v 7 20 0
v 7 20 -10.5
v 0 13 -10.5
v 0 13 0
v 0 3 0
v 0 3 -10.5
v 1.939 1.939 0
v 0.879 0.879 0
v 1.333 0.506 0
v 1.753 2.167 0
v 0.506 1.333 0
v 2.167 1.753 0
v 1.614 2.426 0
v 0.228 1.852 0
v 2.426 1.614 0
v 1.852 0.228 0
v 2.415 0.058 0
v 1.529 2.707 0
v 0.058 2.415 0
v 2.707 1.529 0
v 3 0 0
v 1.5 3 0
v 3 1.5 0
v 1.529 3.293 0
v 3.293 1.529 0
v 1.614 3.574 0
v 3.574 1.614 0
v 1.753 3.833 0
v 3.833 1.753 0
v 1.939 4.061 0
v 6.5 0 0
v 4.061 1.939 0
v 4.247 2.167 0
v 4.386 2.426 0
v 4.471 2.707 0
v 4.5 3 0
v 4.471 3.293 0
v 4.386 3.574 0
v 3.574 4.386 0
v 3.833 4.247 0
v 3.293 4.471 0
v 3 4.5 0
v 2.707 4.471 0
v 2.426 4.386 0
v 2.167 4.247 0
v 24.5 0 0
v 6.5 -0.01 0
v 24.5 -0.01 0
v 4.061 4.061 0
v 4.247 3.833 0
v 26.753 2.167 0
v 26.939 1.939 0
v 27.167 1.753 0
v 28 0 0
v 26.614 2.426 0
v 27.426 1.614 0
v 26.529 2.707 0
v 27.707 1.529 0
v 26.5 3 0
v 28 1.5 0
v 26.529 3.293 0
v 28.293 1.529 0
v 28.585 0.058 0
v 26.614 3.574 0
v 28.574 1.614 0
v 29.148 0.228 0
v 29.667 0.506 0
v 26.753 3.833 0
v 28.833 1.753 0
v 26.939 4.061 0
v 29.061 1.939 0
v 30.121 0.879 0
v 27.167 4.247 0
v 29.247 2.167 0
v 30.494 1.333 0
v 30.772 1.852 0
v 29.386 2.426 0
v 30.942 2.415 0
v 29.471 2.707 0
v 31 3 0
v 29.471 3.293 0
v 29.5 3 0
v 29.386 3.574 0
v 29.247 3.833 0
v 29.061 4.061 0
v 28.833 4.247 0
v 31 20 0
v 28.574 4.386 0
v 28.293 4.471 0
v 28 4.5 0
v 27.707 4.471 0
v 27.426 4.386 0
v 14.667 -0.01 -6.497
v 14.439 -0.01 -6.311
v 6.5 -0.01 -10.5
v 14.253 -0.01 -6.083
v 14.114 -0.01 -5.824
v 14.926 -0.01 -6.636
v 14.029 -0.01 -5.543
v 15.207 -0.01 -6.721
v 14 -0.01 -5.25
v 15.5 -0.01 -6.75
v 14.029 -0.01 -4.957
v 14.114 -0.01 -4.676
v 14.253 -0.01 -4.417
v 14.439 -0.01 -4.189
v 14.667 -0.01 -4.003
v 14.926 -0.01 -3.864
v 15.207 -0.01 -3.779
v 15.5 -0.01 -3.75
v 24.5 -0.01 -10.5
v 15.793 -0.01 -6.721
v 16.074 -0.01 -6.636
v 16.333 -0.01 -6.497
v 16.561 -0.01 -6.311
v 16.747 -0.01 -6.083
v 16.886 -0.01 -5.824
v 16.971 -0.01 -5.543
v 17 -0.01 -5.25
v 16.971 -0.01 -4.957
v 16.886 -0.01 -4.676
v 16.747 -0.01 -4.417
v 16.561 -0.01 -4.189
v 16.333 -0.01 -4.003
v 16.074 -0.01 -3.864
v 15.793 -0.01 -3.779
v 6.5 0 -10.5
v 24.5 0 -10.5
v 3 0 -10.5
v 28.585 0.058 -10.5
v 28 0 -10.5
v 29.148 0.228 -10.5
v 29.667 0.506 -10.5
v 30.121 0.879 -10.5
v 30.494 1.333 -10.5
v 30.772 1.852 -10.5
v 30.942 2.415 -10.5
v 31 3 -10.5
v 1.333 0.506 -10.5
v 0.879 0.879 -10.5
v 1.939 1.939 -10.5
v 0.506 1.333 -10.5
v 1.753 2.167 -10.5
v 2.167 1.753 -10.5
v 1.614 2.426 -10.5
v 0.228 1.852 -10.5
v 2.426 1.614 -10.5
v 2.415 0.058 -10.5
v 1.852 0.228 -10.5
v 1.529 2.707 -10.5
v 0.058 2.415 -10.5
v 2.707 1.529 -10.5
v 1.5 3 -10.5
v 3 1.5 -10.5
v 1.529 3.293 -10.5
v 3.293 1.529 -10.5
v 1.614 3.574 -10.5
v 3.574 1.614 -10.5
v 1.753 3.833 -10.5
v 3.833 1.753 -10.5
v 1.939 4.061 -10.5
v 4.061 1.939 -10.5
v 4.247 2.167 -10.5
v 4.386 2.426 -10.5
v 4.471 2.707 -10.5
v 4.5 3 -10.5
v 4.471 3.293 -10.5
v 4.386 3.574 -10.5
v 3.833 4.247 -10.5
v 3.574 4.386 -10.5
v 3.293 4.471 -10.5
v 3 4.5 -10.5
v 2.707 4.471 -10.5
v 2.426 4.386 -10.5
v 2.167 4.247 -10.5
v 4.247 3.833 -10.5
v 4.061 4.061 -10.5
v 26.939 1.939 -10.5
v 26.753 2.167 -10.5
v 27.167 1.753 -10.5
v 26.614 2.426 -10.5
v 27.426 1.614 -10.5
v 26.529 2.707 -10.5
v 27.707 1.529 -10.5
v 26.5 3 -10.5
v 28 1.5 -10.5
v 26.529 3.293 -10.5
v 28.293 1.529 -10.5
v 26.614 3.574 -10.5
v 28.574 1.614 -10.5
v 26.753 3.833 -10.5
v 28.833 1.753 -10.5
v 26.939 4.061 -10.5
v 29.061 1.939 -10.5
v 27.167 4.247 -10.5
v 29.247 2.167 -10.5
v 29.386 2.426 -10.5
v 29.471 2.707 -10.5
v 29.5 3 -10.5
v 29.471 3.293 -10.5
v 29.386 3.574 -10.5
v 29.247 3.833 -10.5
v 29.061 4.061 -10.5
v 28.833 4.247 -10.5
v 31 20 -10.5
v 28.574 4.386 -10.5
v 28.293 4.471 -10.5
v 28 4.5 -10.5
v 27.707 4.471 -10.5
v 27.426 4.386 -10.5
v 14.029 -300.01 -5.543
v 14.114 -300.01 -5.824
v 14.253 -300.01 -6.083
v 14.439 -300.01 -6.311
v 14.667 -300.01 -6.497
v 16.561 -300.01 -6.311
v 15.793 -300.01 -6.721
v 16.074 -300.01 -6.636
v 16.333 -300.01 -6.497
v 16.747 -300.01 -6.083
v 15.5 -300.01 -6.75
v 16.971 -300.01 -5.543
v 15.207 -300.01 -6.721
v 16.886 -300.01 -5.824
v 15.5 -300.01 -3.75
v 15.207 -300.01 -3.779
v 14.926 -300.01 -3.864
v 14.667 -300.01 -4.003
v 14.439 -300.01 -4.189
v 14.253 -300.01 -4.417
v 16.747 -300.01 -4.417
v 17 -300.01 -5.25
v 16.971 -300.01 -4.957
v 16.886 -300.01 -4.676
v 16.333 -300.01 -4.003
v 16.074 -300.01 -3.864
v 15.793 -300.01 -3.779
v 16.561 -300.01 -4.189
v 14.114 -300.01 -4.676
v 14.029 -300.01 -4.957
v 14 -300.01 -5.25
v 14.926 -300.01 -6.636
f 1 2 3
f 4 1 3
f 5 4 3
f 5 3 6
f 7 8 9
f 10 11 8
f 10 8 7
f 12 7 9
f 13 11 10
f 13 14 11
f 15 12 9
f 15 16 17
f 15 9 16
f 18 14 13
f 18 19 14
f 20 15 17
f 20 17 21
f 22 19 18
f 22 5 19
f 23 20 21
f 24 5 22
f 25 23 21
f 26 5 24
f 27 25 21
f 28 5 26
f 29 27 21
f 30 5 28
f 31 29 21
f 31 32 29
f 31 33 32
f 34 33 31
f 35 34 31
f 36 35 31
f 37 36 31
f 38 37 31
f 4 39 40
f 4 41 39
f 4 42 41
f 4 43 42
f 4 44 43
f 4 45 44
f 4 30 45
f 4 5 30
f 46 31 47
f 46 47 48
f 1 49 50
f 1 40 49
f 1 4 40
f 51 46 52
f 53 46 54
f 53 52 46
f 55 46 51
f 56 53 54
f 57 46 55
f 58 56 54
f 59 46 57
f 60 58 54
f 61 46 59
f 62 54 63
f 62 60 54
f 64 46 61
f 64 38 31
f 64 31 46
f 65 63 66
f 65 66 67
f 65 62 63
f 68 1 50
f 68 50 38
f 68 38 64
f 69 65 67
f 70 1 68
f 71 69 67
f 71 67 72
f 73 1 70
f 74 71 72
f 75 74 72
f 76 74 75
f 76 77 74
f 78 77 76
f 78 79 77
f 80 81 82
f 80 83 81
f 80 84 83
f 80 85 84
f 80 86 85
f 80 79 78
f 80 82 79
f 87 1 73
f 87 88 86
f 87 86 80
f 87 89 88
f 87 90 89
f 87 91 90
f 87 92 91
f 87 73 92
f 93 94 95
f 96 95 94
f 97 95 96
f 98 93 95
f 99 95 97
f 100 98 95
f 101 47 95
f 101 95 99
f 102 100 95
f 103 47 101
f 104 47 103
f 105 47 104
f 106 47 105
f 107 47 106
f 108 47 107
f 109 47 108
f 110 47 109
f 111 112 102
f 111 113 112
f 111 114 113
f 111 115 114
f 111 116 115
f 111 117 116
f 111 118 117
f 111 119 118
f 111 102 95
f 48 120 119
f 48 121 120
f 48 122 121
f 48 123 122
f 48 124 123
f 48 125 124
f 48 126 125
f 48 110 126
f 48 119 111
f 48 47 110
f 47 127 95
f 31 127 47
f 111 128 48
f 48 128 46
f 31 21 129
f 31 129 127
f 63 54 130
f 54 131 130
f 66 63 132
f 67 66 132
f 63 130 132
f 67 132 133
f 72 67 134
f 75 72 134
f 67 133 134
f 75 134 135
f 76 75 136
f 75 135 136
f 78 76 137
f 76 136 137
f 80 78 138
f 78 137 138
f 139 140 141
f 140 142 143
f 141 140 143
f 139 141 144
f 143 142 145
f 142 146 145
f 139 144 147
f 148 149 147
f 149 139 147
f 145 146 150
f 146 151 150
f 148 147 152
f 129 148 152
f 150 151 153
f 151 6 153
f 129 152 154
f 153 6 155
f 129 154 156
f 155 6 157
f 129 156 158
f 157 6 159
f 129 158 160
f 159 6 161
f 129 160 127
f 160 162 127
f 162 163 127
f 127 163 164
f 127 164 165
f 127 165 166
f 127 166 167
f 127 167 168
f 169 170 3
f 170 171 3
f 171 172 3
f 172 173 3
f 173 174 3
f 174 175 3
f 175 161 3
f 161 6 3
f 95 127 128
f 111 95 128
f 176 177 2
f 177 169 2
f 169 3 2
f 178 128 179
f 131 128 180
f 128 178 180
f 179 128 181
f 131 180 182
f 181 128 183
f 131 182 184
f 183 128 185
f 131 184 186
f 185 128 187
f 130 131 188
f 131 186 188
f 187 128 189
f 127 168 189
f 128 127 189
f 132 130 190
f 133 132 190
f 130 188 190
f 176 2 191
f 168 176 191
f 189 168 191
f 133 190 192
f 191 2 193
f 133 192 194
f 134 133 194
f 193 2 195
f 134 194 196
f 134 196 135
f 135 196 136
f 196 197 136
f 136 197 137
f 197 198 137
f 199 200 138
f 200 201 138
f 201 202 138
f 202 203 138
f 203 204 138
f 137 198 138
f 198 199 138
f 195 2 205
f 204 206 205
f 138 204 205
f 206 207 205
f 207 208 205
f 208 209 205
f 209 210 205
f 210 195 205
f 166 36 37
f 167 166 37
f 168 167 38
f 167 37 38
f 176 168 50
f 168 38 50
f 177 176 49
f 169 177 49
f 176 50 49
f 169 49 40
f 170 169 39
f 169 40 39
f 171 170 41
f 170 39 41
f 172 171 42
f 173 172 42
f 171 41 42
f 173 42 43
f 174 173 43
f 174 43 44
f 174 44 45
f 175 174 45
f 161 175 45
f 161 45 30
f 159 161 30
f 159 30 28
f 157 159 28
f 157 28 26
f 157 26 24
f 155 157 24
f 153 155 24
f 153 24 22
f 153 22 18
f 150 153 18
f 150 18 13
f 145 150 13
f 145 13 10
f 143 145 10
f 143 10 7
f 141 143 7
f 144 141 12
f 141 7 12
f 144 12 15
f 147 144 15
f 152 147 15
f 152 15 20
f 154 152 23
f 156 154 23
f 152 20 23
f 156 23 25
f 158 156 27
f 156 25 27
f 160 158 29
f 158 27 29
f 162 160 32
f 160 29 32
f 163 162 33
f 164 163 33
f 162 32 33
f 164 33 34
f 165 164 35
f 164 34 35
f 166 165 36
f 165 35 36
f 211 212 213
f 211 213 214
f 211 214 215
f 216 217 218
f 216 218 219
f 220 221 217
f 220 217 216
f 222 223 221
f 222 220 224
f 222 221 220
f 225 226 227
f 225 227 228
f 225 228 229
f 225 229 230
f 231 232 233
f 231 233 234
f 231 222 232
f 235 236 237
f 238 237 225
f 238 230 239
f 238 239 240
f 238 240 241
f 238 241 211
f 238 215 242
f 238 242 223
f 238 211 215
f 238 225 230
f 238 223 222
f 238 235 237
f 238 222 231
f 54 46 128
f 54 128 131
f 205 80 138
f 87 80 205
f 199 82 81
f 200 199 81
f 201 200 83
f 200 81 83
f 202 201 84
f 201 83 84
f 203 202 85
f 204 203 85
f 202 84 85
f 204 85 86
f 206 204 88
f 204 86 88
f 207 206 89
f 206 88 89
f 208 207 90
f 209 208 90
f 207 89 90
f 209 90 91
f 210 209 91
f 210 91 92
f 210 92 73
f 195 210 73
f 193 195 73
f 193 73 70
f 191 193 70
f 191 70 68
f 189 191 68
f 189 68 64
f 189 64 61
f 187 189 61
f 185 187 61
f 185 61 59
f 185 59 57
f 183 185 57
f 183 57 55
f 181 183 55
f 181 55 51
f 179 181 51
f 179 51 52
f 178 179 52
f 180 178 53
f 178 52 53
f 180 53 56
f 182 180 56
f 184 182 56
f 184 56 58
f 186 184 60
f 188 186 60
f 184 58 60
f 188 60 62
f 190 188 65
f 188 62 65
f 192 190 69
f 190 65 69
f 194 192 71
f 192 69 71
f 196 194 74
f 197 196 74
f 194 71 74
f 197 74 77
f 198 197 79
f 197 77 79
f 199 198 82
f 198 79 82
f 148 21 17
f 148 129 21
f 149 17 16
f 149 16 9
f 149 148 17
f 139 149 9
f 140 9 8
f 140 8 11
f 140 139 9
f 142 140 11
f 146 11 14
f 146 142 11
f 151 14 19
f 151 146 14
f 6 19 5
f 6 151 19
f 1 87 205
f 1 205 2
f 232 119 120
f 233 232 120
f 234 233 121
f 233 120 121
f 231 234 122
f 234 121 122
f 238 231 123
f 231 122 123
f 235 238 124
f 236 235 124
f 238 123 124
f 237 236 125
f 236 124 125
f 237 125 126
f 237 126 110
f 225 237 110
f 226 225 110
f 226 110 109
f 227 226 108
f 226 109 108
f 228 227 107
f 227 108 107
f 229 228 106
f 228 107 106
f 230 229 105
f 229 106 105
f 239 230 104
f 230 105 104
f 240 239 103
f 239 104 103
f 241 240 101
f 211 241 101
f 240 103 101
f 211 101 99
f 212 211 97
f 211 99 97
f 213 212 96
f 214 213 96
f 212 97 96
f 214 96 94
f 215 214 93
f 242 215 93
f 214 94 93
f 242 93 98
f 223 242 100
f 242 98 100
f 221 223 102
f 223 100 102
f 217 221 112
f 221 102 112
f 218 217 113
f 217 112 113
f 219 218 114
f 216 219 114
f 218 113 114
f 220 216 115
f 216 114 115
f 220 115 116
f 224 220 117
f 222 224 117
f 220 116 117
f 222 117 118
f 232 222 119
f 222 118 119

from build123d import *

# Parameters (mm, degrees)
BOSS_EXTRU_1_DEPTH      = 10.5
ESQUISSE2_R             = 1.5
ENL_V_MAT_EXTRU_1_DEPTH = 11.5
CONG_1_R                = 3
ESQUISSE3_W             = 18
ESQUISSE3_H             = 10.5
BOSS_EXTRU_2_DEPTH      = 0.01
ESQUISSE4_R             = 1.5
BOSS_EXTRU_3_DEPTH      = 300


with BuildPart() as part:
    # Esquisse1 → Boss.-Extru.1 (new body)
    with BuildSketch(Plane.XY):
        Polygon((0, 0), (31, 0), (31, 20), (7, 20), (0, 13), align=None)
    extrude(amount=-BOSS_EXTRU_1_DEPTH)

    # Esquisse2 → Enlèv. mat.-Extru.1 (cut, through all)
    with BuildSketch(Plane.XY):
        with Locations((3, 3)):
            Circle(ESQUISSE2_R)
        with Locations((28, 3)):
            Circle(ESQUISSE2_R)
    extrude(amount=-ENL_V_MAT_EXTRU_1_DEPTH, mode=Mode.SUBTRACT)

    # Congé1
    cong_1_edges = [part.edges().sort_by_distance(p)[0] for p in [
        (31, 0, -5.25),
        (0, 0, -5.25),
    ]]
    fillet(cong_1_edges, radius=CONG_1_R)

    # Esquisse3 → Boss.-Extru.2 (add)
    with BuildSketch(Plane.XZ):
        with Locations((15.5, -5.25)):
            Rectangle(ESQUISSE3_W, ESQUISSE3_H)
    extrude(amount=BOSS_EXTRU_2_DEPTH)

    # Esquisse4 → Boss.-Extru.3 (add)
    with BuildSketch(Plane.XZ.offset(0.01)):
        with Locations((15.5, -5.25)):
            Circle(ESQUISSE4_R)
    extrude(amount=BOSS_EXTRU_3_DEPTH)


solid = part.part
